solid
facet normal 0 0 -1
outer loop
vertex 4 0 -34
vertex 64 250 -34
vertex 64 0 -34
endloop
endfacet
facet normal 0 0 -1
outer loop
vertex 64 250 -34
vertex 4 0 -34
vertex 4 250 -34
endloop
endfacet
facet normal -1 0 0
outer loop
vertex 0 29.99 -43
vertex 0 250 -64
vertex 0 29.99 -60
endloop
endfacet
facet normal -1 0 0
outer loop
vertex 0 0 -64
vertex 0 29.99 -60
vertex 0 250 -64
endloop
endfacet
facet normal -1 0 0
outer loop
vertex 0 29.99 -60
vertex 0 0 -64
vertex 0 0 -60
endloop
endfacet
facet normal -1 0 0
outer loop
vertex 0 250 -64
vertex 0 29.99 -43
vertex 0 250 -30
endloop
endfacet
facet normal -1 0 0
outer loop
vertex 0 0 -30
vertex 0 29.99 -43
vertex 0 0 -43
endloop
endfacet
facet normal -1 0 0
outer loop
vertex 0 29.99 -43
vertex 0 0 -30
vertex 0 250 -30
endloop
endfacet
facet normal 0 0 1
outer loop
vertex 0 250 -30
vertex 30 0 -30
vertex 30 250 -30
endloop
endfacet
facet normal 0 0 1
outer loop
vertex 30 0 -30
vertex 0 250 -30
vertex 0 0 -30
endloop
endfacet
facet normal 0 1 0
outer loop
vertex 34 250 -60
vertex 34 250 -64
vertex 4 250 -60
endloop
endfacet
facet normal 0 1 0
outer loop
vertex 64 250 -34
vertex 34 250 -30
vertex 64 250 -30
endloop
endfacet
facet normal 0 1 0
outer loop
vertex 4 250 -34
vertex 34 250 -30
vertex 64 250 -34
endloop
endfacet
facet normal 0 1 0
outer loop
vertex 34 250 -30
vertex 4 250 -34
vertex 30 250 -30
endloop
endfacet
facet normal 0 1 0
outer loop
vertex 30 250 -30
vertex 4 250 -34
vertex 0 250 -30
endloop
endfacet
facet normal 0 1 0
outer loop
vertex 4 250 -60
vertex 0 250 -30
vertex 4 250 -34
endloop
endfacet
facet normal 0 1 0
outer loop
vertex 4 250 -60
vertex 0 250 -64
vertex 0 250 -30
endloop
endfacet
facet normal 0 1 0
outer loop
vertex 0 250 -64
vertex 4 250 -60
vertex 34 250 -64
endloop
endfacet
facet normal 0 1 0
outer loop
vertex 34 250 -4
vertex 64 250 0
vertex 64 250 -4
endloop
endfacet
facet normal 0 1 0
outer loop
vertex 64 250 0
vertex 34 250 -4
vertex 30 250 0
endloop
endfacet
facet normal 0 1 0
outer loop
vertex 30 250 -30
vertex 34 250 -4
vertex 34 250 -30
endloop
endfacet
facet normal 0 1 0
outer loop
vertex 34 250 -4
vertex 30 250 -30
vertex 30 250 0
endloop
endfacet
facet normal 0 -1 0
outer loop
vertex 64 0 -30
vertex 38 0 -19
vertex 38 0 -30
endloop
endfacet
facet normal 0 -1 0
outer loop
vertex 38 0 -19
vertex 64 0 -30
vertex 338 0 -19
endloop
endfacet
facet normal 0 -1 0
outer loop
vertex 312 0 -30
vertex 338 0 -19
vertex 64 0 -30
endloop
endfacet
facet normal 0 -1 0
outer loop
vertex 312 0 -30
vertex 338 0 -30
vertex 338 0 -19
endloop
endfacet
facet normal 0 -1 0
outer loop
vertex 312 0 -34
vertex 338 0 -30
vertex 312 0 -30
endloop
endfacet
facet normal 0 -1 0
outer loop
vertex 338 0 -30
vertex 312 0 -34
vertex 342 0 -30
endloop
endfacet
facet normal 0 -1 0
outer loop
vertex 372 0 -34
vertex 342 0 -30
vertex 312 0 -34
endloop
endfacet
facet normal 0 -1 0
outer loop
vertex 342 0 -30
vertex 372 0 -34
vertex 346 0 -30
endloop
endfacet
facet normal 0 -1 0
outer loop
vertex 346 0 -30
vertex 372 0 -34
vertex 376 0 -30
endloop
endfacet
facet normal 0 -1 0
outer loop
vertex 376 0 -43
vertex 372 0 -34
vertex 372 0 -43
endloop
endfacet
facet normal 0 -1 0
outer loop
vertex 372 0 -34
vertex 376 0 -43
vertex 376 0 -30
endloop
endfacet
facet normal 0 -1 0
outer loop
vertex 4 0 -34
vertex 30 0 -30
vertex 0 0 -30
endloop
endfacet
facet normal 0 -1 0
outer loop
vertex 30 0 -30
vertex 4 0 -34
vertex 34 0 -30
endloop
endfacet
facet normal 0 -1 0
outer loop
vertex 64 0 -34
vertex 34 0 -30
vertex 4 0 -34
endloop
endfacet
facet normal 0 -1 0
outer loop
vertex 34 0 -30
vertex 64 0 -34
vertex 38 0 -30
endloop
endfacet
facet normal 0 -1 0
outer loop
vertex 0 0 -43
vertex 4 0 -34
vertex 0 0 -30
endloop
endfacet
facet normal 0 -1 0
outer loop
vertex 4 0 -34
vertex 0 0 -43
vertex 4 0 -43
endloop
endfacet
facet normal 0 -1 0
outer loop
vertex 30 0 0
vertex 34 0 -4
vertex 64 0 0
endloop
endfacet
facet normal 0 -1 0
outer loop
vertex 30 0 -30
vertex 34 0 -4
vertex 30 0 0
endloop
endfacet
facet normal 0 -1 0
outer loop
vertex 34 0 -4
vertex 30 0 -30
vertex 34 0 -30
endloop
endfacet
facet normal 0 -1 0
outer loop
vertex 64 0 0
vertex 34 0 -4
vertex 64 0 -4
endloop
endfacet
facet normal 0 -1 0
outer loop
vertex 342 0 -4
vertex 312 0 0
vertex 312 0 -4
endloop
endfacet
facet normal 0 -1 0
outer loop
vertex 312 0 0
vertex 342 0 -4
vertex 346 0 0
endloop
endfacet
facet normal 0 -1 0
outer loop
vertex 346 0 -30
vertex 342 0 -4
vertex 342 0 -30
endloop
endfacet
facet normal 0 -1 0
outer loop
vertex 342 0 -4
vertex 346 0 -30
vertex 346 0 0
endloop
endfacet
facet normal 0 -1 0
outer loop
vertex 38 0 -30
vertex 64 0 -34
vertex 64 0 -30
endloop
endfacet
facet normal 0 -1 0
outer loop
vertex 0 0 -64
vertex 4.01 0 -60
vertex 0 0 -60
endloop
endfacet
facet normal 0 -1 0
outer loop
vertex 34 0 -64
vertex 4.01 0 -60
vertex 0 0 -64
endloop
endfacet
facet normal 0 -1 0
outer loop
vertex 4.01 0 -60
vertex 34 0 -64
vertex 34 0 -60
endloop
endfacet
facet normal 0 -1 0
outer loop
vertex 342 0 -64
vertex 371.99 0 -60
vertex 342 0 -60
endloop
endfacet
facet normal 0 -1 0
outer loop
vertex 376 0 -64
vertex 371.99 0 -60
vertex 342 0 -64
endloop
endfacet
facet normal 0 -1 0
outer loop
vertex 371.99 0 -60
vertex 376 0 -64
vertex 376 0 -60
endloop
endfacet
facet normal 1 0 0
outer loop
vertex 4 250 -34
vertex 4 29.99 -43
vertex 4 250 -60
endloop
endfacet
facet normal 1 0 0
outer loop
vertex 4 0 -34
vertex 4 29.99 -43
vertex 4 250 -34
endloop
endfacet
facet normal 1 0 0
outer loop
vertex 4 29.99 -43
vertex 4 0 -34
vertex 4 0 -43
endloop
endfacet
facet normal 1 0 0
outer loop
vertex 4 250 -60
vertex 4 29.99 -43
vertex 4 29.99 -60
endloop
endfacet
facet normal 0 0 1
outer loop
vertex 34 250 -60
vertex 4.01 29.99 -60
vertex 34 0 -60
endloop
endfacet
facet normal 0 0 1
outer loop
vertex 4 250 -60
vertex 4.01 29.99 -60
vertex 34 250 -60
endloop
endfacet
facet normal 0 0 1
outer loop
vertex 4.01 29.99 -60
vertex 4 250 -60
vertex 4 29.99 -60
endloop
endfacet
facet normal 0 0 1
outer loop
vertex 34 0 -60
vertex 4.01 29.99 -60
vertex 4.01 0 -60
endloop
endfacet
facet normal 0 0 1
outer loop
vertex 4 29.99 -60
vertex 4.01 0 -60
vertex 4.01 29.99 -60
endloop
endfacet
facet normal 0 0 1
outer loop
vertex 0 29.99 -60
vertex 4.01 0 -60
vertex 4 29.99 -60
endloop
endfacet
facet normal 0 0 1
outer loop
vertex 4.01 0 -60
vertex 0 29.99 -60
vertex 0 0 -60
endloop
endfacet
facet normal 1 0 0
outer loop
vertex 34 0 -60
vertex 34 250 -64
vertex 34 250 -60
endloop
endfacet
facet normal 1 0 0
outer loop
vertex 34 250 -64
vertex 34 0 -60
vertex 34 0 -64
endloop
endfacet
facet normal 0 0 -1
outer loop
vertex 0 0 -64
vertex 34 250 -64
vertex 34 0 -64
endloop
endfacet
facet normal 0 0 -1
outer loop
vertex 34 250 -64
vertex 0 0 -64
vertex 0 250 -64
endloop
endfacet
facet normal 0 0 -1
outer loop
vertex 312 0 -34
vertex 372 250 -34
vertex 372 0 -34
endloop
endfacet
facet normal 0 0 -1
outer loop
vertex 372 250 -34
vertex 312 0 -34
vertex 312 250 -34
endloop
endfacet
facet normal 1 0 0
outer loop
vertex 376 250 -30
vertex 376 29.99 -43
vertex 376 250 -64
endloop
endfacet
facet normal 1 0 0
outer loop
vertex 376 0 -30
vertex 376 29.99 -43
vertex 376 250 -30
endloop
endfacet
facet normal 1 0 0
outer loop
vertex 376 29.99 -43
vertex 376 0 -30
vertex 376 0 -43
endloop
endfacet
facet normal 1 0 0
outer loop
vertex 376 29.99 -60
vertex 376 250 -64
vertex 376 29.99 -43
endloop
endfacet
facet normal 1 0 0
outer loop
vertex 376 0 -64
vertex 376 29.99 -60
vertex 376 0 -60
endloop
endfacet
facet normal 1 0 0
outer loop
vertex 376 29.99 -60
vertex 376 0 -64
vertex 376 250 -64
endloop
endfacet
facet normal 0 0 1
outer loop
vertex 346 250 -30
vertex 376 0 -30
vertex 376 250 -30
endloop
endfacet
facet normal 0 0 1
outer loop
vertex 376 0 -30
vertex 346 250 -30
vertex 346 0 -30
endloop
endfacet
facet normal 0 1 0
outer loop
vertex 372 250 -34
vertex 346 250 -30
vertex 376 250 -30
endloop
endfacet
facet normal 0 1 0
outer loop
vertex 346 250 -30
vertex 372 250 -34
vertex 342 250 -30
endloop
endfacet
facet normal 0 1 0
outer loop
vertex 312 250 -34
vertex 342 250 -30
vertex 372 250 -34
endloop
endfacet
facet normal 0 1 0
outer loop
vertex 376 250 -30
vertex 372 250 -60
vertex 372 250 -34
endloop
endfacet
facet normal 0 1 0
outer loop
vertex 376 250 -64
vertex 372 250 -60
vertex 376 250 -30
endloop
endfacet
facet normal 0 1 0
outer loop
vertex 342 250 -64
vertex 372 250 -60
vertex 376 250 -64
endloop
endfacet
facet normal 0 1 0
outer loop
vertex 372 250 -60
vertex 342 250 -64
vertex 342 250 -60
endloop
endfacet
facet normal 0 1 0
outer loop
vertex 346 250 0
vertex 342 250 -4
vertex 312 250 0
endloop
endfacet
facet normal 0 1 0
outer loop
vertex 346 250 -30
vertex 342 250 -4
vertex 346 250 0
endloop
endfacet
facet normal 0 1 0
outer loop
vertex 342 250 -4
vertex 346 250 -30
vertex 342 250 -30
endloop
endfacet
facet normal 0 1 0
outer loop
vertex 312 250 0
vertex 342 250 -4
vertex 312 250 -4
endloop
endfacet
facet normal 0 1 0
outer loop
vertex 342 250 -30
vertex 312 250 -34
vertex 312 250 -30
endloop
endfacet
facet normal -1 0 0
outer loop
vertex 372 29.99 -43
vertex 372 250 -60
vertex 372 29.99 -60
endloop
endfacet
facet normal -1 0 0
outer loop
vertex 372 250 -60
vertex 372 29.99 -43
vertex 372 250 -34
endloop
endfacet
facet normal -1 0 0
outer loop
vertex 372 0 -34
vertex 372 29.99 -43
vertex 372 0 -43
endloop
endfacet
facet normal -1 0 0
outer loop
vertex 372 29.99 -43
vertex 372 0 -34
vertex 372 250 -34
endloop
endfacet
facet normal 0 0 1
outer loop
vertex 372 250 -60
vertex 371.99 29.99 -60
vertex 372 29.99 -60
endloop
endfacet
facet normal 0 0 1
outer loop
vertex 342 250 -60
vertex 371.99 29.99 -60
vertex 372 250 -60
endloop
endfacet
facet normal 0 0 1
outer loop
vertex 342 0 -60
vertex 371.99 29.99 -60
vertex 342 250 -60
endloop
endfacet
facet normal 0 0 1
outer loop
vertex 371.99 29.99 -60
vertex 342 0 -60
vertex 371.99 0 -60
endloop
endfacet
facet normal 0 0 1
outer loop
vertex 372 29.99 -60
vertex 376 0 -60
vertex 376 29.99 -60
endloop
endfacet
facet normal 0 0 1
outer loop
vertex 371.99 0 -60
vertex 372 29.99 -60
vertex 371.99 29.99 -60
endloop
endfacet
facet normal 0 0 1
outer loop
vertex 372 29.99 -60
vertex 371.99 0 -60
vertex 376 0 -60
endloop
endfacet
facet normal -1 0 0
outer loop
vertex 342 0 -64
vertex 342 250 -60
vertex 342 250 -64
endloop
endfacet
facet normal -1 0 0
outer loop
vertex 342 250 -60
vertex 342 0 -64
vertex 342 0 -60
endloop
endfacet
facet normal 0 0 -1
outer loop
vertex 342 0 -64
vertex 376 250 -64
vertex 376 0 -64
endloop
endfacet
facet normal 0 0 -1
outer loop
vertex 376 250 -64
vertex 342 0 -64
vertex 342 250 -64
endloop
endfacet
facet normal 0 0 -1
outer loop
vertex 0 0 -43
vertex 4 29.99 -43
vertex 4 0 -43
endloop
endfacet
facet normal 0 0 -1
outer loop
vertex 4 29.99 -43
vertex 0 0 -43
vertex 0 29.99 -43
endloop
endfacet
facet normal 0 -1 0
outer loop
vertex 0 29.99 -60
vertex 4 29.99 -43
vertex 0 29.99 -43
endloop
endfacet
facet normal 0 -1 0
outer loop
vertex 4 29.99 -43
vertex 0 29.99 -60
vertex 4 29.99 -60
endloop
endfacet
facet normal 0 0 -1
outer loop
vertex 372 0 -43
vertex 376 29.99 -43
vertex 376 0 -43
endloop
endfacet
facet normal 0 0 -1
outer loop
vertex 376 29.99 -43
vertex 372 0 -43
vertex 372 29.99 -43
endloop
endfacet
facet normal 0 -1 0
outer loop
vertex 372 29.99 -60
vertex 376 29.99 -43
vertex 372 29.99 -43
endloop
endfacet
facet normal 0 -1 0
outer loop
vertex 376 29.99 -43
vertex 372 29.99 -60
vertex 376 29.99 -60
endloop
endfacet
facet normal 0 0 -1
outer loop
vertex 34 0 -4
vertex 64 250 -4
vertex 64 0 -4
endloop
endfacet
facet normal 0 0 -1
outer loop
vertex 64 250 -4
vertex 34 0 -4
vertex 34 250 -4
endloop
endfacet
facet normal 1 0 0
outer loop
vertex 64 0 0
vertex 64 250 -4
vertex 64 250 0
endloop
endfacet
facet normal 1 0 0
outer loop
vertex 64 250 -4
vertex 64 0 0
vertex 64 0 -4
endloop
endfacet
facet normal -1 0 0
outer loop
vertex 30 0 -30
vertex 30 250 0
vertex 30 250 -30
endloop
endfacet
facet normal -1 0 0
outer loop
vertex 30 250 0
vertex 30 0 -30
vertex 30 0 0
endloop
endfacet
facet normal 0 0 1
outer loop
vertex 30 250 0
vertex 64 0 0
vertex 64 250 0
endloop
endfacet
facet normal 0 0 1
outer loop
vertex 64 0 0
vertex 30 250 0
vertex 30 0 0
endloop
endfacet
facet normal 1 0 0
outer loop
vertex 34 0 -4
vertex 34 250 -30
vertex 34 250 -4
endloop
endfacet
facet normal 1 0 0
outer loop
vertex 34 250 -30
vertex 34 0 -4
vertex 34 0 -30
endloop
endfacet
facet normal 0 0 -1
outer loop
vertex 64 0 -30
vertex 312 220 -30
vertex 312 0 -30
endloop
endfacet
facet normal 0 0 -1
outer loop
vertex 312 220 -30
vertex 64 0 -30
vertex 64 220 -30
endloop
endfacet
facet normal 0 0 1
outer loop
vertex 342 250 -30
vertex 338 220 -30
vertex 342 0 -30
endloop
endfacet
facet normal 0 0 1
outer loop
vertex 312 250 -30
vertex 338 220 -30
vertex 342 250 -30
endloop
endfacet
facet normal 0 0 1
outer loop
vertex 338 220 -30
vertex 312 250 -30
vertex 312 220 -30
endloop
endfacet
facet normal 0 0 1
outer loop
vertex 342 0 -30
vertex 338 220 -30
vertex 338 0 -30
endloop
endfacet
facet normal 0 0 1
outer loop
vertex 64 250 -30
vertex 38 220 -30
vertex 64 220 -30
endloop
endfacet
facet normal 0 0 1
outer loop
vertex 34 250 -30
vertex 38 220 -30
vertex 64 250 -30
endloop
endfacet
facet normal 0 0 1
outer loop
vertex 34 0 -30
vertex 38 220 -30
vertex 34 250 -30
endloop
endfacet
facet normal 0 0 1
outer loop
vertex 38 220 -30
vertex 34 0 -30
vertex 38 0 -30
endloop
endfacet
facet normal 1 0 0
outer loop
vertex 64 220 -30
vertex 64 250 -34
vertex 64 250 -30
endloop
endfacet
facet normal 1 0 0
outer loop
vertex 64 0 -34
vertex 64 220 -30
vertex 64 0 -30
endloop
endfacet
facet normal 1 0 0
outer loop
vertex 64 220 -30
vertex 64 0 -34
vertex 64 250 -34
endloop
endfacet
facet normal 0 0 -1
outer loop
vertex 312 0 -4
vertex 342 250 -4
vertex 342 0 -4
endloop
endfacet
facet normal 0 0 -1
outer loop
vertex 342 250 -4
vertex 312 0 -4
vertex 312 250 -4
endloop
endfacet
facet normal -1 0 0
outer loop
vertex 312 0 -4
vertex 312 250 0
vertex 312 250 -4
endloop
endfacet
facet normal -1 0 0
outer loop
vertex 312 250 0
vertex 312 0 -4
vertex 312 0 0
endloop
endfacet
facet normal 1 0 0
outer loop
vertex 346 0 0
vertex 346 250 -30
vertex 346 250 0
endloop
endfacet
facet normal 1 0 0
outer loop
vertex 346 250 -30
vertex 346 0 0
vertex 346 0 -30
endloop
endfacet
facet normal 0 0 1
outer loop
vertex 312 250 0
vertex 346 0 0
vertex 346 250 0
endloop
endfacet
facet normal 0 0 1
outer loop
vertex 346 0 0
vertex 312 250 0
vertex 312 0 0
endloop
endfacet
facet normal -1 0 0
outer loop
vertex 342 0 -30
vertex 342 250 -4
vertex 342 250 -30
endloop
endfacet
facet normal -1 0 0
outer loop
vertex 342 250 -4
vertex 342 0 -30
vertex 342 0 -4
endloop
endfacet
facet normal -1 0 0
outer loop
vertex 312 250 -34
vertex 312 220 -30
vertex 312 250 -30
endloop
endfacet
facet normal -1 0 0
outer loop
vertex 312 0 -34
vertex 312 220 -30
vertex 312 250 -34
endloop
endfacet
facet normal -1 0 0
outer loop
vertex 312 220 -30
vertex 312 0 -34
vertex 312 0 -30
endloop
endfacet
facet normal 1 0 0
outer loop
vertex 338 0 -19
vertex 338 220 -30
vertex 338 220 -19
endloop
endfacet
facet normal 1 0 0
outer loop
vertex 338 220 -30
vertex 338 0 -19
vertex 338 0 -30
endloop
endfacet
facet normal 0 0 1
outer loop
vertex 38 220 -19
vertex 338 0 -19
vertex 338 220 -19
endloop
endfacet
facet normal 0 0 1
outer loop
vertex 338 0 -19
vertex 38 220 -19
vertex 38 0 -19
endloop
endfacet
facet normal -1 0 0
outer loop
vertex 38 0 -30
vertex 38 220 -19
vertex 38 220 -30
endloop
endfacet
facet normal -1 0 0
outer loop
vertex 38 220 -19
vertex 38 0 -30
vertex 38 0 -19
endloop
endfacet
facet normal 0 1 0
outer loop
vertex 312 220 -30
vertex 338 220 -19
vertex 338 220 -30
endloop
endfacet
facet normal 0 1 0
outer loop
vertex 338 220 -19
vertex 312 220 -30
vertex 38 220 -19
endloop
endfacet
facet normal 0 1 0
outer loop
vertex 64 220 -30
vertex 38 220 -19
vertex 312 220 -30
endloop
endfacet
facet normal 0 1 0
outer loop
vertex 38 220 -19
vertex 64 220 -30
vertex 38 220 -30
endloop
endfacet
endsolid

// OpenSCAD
module shelf(laptop_width, laptop_depth, laptop_height, wall_width, shelf_depth, shelf_height, shelf_width, gap) {
    translate([0, 0, 0]) rotate([0, 90, 0]) cube([wall_width, shelf_depth, shelf_height+wall_width]);
    translate([0, 0, -shelf_height]) cube([wall_width, shelf_depth, shelf_height]);
    translate([0, 0, -shelf_height-wall_width]) cube([wall_width + shelf_width, shelf_depth, wall_width]);
}

//big laptop
laptop_width_1 = 360;
laptop_depth_1 = 250;
laptop_height_1 = 17;
shelf_height_1 = 30;

wall_width = 4;
gap = 8;

module shelf_1() {
    difference() {
        translate([0, 0, -shelf_height_1]) {
            //translate([gap, 0, -shelf_height_1]) cube([laptop_width_1, laptop_depth_1, laptop_height_1]);

            shelf(laptop_width_1, laptop_depth_1, laptop_height_1, wall_width, 250, shelf_height_1, shelf_height_1, 8);
            translate([laptop_width_1 + gap*2, laptop_depth_1, 0]) rotate([0, 0, 180]) shelf(laptop_width_1, laptop_depth_1, laptop_height_1, 4, 250, shelf_height_1, shelf_height_1, 8);
        }
        translate([-.01, -.01, -shelf_height_1*2]) cube([wall_width+.02, 30, laptop_height_1]);
        translate([laptop_width_1+gap*2-wall_width-.01, -.01, -shelf_height_1*2]) cube([wall_width+.02, 30, laptop_height_1]);
    }

}

laptop_width_2 = 300;
laptop_depth_2 = 220;
laptop_height_2= 11;

module shelf_2() {
    translate([(laptop_width_1-laptop_width_2)/2, 0, 0]) {
        translate([gap, 0, -shelf_height_1]) cube([laptop_width_2, laptop_depth_2, laptop_height_2]);
        shelf(laptop_width_2, laptop_depth_2, laptop_height_2, wall_width, 250, shelf_height_1, shelf_height_1, 8);
        translate([laptop_width_2 + gap*2, laptop_depth_1, 0]) rotate([0, 0, 180]) shelf(laptop_width_2, laptop_depth_2, laptop_height_2, wall_width, 250, shelf_height_1, shelf_height_1, 8);
    }
}

shelf_1();
shelf_2();
